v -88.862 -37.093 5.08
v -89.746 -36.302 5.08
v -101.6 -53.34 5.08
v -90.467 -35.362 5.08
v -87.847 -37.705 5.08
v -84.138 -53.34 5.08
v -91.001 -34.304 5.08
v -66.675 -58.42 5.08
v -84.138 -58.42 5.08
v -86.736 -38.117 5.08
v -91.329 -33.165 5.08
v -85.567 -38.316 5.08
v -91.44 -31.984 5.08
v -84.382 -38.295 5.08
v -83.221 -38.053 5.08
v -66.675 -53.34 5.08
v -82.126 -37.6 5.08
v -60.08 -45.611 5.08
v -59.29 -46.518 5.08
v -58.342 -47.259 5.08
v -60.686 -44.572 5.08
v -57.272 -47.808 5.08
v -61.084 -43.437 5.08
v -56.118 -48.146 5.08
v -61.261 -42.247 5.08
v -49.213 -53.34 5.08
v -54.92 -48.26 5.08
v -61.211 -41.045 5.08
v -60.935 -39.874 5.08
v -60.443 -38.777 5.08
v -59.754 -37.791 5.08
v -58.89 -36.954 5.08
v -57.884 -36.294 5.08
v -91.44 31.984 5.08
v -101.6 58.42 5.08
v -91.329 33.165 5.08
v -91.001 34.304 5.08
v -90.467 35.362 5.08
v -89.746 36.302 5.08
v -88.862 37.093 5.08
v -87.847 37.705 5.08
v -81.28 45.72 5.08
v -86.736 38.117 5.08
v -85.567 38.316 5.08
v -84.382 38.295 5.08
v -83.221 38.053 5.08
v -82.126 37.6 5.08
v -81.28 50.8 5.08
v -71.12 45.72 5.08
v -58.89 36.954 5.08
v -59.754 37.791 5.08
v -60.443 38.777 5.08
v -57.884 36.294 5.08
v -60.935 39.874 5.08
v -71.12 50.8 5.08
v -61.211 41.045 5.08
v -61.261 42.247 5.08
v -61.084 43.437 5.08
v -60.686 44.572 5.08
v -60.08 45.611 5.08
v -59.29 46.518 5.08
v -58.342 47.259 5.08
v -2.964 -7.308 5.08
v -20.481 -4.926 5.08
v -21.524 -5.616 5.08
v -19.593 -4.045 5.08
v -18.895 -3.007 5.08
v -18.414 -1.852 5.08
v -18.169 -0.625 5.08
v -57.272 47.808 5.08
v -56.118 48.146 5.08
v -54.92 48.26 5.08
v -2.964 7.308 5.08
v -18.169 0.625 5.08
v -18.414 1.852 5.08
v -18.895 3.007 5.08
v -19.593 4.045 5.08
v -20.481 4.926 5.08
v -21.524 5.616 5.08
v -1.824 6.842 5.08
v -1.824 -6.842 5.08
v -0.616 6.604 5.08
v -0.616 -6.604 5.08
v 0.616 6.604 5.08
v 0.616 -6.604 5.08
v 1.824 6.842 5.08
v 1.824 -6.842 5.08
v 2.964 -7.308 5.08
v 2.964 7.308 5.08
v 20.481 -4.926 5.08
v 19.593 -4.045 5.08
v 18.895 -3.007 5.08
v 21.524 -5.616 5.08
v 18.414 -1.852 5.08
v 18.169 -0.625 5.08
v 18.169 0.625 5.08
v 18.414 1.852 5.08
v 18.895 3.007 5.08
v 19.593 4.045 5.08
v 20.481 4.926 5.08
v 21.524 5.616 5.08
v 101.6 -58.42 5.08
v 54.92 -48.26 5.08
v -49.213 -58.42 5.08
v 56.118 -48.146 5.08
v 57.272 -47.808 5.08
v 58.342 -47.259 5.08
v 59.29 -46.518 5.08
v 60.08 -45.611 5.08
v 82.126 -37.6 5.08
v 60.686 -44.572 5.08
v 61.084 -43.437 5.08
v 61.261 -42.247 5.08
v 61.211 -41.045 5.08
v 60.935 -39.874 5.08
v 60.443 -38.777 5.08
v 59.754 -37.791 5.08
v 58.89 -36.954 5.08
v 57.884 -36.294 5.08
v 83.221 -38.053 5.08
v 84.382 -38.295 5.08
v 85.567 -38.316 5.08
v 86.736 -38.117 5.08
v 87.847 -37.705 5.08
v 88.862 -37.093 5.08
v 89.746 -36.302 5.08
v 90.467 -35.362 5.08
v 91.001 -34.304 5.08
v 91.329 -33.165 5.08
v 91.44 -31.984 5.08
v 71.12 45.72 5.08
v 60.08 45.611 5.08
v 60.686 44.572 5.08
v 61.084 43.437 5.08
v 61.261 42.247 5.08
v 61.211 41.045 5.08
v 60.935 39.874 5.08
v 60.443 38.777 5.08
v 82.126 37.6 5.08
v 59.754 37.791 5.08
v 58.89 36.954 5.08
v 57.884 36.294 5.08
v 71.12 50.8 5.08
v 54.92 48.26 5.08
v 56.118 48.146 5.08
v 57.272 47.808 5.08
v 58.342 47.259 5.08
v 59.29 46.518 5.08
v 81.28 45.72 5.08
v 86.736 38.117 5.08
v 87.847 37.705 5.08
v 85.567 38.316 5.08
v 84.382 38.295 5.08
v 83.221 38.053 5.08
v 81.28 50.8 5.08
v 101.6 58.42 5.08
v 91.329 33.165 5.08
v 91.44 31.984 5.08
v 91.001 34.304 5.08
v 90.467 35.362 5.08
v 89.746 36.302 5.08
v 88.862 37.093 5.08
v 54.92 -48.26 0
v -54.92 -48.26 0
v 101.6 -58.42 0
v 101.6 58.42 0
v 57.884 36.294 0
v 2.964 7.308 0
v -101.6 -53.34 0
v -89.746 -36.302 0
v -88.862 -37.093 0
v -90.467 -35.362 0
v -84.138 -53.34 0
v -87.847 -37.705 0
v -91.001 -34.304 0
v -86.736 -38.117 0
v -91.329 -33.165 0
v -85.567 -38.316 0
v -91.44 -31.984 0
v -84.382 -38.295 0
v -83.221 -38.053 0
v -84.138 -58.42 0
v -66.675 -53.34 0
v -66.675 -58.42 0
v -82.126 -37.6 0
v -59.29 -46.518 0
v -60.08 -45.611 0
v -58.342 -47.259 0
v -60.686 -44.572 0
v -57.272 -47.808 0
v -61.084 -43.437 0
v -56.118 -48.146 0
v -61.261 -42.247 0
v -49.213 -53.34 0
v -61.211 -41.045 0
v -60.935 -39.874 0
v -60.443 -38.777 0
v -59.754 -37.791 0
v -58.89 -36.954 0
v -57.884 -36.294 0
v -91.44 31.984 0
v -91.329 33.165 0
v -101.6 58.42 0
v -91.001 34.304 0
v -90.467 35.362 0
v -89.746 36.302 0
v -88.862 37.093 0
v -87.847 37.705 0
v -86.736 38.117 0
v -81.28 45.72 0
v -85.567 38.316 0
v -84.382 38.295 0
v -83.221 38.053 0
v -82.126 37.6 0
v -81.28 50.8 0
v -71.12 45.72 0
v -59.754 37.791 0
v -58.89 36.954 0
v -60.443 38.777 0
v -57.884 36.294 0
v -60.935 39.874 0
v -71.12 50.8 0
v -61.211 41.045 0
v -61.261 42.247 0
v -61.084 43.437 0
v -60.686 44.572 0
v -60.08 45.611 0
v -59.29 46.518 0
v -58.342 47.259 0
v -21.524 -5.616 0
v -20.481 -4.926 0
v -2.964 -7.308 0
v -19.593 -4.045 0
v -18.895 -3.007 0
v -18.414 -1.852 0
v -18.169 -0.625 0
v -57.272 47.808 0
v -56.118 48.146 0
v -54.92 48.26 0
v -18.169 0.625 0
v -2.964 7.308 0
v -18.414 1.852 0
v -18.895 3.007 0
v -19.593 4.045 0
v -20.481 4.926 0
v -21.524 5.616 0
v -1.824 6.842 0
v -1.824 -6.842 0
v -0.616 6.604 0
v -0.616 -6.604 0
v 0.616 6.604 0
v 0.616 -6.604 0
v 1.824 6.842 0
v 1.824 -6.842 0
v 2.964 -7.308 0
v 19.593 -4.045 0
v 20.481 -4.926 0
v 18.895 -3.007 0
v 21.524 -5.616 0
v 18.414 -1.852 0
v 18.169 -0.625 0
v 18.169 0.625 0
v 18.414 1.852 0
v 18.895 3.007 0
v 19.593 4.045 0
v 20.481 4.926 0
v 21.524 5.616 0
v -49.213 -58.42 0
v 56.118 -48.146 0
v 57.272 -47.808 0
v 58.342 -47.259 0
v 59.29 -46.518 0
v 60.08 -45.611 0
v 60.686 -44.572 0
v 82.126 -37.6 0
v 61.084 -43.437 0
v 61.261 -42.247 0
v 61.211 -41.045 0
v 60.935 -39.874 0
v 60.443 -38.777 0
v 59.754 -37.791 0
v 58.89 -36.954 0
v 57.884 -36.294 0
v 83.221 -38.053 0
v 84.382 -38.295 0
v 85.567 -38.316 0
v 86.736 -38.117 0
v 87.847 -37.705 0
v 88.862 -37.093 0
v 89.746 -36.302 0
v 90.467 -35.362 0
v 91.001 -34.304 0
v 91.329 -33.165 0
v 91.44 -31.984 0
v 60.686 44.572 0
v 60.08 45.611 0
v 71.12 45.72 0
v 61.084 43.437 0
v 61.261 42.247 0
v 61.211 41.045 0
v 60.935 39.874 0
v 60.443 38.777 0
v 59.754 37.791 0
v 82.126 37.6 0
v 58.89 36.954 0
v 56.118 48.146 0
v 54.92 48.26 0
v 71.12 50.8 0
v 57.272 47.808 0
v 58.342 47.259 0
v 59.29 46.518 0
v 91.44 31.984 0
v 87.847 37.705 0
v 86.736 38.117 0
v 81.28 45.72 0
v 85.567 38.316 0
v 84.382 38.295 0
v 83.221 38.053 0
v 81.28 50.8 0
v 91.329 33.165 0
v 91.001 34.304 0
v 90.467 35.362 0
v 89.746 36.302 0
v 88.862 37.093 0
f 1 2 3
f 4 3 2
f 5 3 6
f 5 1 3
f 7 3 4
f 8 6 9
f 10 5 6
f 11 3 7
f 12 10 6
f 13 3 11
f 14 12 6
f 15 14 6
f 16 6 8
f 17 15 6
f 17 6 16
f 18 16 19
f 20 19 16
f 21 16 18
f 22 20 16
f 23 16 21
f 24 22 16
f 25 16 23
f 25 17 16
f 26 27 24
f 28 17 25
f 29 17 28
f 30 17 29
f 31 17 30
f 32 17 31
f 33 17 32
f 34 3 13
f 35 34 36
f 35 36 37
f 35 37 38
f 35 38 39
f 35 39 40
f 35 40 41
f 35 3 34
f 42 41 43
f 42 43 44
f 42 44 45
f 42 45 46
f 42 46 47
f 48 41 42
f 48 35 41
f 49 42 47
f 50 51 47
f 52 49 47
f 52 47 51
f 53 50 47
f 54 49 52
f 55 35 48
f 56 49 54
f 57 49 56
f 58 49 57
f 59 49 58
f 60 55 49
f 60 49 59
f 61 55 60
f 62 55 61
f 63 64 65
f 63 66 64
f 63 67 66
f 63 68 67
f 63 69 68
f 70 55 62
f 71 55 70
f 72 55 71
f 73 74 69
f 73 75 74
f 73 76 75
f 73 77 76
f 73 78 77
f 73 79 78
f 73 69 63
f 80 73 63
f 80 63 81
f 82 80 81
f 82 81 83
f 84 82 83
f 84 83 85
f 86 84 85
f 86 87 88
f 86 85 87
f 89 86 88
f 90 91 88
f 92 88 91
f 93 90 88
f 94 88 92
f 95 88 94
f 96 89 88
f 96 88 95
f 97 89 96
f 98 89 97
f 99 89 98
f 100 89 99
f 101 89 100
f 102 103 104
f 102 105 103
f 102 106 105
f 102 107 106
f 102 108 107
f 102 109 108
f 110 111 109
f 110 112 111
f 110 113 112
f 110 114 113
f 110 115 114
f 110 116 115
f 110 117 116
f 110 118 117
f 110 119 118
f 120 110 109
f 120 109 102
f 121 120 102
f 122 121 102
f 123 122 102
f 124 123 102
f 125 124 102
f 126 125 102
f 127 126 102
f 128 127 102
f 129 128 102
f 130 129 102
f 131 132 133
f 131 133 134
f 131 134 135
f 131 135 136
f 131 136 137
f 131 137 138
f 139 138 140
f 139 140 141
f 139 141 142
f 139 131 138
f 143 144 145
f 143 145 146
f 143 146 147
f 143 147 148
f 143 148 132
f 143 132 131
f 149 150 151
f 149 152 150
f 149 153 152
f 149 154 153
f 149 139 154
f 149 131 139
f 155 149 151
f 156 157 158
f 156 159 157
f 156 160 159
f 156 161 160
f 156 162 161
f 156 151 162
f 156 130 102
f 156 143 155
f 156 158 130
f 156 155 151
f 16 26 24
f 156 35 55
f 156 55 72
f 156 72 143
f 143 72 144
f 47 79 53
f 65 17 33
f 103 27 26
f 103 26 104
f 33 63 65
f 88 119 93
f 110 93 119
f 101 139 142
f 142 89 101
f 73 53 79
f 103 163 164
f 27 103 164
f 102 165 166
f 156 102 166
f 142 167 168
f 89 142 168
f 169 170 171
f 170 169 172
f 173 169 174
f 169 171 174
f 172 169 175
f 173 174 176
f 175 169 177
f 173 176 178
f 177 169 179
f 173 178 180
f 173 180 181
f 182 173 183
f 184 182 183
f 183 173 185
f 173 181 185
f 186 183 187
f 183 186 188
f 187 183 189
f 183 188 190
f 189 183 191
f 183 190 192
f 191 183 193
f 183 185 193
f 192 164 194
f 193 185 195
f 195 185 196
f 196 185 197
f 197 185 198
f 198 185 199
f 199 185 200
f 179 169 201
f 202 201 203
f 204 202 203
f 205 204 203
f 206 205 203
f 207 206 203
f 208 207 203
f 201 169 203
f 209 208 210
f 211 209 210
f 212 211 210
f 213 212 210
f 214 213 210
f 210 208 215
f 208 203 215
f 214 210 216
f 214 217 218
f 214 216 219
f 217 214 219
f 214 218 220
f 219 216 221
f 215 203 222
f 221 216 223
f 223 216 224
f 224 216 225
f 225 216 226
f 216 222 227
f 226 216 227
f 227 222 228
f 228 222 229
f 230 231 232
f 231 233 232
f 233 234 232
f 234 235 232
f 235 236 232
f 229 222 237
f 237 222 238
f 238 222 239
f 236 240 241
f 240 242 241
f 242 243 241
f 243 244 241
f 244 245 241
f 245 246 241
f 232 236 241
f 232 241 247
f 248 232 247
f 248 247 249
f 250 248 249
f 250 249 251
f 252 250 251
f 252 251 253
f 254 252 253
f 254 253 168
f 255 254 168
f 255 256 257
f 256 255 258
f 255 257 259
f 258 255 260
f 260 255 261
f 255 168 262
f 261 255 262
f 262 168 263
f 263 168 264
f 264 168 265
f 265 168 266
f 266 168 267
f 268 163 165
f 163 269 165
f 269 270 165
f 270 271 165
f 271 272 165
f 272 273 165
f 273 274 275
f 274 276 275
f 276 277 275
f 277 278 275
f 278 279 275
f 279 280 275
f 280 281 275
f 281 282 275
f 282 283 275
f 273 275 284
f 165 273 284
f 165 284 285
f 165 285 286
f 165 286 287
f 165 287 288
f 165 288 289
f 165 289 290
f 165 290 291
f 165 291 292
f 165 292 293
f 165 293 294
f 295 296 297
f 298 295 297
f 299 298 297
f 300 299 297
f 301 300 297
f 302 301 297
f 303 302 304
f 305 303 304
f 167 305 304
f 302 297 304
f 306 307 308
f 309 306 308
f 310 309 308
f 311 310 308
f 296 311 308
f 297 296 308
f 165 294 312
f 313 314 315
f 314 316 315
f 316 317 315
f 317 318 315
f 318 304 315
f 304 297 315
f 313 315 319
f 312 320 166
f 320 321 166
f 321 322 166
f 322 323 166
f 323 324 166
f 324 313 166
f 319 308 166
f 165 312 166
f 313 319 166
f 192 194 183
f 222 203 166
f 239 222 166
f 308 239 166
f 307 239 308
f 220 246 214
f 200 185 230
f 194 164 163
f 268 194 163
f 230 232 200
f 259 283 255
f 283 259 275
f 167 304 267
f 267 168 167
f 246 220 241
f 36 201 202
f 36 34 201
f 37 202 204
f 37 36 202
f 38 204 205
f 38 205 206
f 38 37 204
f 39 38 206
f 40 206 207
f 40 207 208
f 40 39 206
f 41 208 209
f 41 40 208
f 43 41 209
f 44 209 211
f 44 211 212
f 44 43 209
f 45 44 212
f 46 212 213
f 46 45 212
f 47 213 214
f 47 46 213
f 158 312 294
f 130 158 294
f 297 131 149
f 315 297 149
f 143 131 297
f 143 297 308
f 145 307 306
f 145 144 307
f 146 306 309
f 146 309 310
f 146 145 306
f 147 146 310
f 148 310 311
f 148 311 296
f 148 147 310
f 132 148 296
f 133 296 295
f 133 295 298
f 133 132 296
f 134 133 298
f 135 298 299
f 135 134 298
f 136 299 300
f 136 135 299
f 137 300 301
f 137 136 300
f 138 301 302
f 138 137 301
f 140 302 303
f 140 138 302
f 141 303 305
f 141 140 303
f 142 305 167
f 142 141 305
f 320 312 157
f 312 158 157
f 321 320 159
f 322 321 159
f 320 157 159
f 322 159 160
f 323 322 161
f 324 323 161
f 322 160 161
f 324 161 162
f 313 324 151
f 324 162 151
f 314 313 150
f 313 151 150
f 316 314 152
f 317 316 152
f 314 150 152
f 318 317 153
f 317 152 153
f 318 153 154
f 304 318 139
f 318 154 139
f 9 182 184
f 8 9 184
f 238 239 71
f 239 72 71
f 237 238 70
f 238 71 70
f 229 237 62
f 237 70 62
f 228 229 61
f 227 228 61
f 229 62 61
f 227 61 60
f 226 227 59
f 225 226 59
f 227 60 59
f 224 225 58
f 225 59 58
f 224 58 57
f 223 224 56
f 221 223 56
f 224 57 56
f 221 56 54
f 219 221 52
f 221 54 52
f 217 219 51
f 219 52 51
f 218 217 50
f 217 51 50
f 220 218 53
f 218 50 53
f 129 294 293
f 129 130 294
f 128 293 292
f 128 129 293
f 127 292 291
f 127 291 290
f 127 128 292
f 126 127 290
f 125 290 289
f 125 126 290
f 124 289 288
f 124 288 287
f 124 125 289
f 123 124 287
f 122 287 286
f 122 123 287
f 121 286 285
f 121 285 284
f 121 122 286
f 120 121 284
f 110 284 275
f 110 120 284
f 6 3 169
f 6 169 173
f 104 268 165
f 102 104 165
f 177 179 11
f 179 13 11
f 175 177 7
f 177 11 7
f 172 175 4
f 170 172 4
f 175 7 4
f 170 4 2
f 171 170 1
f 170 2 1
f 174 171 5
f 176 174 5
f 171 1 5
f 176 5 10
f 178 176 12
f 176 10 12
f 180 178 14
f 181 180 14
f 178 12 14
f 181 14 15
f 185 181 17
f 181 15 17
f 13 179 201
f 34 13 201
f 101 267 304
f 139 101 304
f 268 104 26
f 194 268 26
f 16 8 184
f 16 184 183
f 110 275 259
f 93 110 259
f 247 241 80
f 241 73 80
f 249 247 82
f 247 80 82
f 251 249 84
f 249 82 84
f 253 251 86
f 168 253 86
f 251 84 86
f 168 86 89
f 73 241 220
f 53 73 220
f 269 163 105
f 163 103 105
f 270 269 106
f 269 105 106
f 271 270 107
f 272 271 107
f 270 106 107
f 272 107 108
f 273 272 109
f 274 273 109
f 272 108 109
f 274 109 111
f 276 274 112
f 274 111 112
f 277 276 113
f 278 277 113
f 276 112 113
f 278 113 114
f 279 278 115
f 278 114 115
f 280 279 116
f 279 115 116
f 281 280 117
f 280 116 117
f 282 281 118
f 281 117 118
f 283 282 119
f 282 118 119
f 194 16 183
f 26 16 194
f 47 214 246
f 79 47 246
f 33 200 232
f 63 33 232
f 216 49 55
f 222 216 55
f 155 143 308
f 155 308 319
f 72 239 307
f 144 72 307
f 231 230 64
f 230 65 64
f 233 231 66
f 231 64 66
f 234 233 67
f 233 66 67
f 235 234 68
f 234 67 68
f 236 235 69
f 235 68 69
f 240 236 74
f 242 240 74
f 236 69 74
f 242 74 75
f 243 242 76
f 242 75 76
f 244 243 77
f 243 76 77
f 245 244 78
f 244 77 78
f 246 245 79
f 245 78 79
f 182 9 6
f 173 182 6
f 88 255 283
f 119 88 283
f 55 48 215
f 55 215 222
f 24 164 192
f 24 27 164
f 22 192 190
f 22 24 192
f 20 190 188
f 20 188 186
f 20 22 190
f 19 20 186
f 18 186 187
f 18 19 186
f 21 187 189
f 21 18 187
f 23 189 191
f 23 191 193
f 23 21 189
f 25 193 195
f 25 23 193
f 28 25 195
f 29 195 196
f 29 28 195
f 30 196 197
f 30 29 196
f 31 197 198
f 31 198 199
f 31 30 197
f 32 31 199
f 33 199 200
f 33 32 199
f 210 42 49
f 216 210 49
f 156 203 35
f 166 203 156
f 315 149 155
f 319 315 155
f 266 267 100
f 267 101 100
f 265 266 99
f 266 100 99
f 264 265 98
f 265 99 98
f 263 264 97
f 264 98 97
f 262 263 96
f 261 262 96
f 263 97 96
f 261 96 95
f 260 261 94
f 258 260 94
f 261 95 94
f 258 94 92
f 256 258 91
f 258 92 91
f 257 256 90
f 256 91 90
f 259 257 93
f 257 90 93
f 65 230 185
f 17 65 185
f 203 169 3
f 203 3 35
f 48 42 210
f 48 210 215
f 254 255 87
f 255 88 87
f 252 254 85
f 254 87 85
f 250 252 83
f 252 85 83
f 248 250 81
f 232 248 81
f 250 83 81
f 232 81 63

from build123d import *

# Parameters (mm, degrees)
SKETCH1_W               = 203.2
SKETCH1_H               = 116.84
BOSS_EXTRUDE1_DEPTH     = 5.08
FILLET1_R               = 6.35
SKETCH2_W               = 10.16
SKETCH2_H               = 5.08
CUT_EXTRUDE1_DEPTH      = 1
CUT_EXTRUDE1_DEPTH_BACK = 6.08
SKETCH3_W               = 17.4625
SKETCH3_H               = 5.08
CUT_EXTRUDE2_DEPTH      = 10.16


with BuildPart() as part:
    # Sketch1 → Boss-Extrude1 (new body)
    with BuildSketch(Plane.XY):
        Rectangle(SKETCH1_W, SKETCH1_H)
        Polygon((80.556430234, 48.26), (0, 5.744106266), (-80.556430234, 48.26), align=None, mode=Mode.SUBTRACT)
        Polygon((-91.44, 42.515893734), (-10.883569766, 0), (-91.44, -42.515893734), align=None, mode=Mode.SUBTRACT)
        Polygon((-80.556430234, -48.26), (0, -5.744106266), (80.556430234, -48.26), align=None, mode=Mode.SUBTRACT)
        Polygon((91.44, -42.515893734), (10.883569766, 0), (91.44, 42.515893734), align=None, mode=Mode.SUBTRACT)
    extrude(amount=BOSS_EXTRUDE1_DEPTH)

    # Fillet1
    fillet1_edges = [part.edges().sort_by_distance(p)[0] for p in [
        (-91.44, 42.515893734, 2.54),
        (-91.44, -42.515893734, 2.54),
        (-10.883569766, 0, 2.54),
        (-80.556430234, -48.26, 2.54),
        (80.556430234, -48.26, 2.54),
        (0, -5.744106266, 2.54),
        (80.556430234, 48.26, 2.54),
        (-80.556430234, 48.26, 2.54),
        (0, 5.744106266, 2.54),
        (91.44, -42.515893734, 2.54),
        (91.44, 42.515893734, 2.54),
        (10.883569766, 0, 2.54),
    ]]
    fillet(fillet1_edges, radius=FILLET1_R)

    # Sketch2 → Cut-Extrude1 (cut, two sides)
    with BuildSketch(Plane.XY.offset(5.08)) as cut_extrude1_sk:
        with Locations((-76.2, 48.26)):
            Rectangle(SKETCH2_W, SKETCH2_H)
        with Locations((76.2, 48.26)):
            Rectangle(SKETCH2_W, SKETCH2_H)
    extrude(amount=CUT_EXTRUDE1_DEPTH, mode=Mode.SUBTRACT)
    extrude(cut_extrude1_sk.sketch, amount=-CUT_EXTRUDE1_DEPTH_BACK, mode=Mode.SUBTRACT)

    # Sketch3 → Cut-Extrude2 (cut)
    with BuildSketch(Plane.XY.offset(5.08)):
        with Locations((-92.86875, -55.88)):
            Rectangle(SKETCH3_W, SKETCH3_H)
        with Locations((-57.94375, -55.88)):
            Rectangle(SKETCH3_W, SKETCH3_H)
    extrude(amount=-CUT_EXTRUDE2_DEPTH, mode=Mode.SUBTRACT)


solid = part.part
